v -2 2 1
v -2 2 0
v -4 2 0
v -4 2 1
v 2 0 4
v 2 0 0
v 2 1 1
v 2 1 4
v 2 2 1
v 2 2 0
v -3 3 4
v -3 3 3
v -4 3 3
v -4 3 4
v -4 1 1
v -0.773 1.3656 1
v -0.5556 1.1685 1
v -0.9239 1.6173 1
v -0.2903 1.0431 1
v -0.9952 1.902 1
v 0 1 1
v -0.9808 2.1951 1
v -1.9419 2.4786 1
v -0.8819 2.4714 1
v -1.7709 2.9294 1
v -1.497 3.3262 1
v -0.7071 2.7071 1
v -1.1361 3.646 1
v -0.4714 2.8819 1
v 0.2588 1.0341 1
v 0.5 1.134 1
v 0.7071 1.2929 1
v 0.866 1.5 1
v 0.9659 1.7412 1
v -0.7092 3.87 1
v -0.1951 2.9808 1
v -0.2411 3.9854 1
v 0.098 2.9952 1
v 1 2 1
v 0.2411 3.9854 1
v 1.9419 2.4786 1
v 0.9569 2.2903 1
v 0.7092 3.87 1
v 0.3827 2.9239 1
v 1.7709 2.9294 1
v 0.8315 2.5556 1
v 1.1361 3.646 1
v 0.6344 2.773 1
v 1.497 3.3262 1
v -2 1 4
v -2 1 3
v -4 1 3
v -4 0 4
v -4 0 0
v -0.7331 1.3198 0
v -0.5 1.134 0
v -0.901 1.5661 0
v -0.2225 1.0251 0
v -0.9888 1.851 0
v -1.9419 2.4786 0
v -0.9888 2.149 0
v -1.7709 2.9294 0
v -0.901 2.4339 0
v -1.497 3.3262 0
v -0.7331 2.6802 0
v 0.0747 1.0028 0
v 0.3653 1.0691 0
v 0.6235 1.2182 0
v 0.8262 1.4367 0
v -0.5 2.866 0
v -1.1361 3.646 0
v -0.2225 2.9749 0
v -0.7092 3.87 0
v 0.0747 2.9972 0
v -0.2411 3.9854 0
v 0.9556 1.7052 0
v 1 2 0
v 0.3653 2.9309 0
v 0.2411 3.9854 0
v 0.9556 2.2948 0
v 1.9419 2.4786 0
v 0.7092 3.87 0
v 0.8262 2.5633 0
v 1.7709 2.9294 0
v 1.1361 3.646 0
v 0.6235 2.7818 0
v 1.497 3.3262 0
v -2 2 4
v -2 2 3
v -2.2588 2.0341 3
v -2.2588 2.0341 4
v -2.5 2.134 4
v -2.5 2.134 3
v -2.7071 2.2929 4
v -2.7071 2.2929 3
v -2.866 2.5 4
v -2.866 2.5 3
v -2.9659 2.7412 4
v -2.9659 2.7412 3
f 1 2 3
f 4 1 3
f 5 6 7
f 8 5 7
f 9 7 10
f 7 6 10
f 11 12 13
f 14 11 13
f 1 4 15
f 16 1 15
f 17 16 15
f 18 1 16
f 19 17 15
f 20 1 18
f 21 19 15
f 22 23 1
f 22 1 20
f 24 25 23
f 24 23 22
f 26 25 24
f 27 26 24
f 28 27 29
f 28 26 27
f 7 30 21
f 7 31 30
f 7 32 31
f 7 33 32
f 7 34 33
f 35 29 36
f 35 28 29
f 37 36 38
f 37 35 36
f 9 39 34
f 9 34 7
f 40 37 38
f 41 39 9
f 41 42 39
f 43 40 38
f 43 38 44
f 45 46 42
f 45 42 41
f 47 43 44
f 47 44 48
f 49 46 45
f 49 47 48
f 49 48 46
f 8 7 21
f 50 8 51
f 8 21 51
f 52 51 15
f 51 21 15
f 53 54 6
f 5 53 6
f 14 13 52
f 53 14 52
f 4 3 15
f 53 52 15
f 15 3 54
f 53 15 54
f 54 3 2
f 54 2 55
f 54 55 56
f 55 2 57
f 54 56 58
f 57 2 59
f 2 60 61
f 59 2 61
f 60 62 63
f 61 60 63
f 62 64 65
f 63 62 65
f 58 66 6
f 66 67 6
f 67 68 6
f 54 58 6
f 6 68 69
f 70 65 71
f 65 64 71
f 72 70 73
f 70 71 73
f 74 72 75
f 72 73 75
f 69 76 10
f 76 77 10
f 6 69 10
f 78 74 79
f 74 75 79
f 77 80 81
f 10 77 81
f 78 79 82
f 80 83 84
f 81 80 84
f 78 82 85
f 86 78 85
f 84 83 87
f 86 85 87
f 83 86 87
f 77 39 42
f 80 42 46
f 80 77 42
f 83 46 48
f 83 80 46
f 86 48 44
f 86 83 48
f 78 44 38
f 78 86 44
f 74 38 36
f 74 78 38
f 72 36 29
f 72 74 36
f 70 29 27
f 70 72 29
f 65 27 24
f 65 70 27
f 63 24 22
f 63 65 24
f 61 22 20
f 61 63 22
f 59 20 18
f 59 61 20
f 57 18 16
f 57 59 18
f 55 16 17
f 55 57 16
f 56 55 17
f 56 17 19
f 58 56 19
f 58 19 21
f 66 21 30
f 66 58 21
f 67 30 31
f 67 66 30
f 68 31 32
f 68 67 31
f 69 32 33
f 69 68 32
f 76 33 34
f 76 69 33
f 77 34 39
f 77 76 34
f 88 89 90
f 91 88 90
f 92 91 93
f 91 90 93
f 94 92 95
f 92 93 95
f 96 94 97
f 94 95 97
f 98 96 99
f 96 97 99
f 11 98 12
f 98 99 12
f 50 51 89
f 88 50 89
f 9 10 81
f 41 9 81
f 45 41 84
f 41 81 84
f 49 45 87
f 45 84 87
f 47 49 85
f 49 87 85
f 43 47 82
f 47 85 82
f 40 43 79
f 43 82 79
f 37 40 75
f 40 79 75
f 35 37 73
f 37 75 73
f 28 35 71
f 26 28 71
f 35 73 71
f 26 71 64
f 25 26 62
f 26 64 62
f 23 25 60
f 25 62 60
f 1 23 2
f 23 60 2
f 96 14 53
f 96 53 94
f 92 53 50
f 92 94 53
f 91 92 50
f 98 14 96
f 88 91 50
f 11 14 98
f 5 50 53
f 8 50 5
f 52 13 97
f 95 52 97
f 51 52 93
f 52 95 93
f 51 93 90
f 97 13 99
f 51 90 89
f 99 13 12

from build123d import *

# Parameters (mm, degrees)
SKETCH_1_R      = 1
EXTRUDE_1_DEPTH = 1
SKETCH_1_6_W    = 6
SKETCH_1_6_H    = 1
EXTRUDE_3_DEPTH = 4
EXTRUDE_START   = 3
EXTRUDE_4_DEPTH = 1


with BuildPart() as part:
    # 草圖1 → 填料-伸長1 (new body)
    with BuildSketch(Plane.XY):
        with BuildLine():
            ThreePointArc((2, 2), (0, 4), (-2, 2))
            Line((-2, 2), (-4, 2))
            Line((-4, 2), (-4, 0))
            Line((-4, 0), (2, 0))
            Line((2, 0), (2, 2))
        make_face()
        with Locations((0, 2)):
            Circle(SKETCH_1_R, mode=Mode.SUBTRACT)
    extrude(amount=EXTRUDE_1_DEPTH)

    # 草圖1<6> → 填料-伸長3 (add)
    with BuildSketch(Plane.XY):
        with Locations((-1, 0.5)):
            Rectangle(SKETCH_1_6_W, SKETCH_1_6_H)
    extrude(amount=EXTRUDE_3_DEPTH)

    # 草圖1<7> → 填料-伸長4 (add)
    with BuildSketch(Plane.XY.offset(EXTRUDE_START)):
        with BuildLine():
            Line((-2, 1), (-2, 2))
            ThreePointArc((-2, 2), (-2.707106781, 2.292893219), (-3, 3))
            Line((-3, 3), (-4, 3))
            Line((-4, 3), (-4, 1))
            Line((-4, 1), (-2, 1))
        make_face()
    extrude(amount=EXTRUDE_4_DEPTH)


solid = part.part
